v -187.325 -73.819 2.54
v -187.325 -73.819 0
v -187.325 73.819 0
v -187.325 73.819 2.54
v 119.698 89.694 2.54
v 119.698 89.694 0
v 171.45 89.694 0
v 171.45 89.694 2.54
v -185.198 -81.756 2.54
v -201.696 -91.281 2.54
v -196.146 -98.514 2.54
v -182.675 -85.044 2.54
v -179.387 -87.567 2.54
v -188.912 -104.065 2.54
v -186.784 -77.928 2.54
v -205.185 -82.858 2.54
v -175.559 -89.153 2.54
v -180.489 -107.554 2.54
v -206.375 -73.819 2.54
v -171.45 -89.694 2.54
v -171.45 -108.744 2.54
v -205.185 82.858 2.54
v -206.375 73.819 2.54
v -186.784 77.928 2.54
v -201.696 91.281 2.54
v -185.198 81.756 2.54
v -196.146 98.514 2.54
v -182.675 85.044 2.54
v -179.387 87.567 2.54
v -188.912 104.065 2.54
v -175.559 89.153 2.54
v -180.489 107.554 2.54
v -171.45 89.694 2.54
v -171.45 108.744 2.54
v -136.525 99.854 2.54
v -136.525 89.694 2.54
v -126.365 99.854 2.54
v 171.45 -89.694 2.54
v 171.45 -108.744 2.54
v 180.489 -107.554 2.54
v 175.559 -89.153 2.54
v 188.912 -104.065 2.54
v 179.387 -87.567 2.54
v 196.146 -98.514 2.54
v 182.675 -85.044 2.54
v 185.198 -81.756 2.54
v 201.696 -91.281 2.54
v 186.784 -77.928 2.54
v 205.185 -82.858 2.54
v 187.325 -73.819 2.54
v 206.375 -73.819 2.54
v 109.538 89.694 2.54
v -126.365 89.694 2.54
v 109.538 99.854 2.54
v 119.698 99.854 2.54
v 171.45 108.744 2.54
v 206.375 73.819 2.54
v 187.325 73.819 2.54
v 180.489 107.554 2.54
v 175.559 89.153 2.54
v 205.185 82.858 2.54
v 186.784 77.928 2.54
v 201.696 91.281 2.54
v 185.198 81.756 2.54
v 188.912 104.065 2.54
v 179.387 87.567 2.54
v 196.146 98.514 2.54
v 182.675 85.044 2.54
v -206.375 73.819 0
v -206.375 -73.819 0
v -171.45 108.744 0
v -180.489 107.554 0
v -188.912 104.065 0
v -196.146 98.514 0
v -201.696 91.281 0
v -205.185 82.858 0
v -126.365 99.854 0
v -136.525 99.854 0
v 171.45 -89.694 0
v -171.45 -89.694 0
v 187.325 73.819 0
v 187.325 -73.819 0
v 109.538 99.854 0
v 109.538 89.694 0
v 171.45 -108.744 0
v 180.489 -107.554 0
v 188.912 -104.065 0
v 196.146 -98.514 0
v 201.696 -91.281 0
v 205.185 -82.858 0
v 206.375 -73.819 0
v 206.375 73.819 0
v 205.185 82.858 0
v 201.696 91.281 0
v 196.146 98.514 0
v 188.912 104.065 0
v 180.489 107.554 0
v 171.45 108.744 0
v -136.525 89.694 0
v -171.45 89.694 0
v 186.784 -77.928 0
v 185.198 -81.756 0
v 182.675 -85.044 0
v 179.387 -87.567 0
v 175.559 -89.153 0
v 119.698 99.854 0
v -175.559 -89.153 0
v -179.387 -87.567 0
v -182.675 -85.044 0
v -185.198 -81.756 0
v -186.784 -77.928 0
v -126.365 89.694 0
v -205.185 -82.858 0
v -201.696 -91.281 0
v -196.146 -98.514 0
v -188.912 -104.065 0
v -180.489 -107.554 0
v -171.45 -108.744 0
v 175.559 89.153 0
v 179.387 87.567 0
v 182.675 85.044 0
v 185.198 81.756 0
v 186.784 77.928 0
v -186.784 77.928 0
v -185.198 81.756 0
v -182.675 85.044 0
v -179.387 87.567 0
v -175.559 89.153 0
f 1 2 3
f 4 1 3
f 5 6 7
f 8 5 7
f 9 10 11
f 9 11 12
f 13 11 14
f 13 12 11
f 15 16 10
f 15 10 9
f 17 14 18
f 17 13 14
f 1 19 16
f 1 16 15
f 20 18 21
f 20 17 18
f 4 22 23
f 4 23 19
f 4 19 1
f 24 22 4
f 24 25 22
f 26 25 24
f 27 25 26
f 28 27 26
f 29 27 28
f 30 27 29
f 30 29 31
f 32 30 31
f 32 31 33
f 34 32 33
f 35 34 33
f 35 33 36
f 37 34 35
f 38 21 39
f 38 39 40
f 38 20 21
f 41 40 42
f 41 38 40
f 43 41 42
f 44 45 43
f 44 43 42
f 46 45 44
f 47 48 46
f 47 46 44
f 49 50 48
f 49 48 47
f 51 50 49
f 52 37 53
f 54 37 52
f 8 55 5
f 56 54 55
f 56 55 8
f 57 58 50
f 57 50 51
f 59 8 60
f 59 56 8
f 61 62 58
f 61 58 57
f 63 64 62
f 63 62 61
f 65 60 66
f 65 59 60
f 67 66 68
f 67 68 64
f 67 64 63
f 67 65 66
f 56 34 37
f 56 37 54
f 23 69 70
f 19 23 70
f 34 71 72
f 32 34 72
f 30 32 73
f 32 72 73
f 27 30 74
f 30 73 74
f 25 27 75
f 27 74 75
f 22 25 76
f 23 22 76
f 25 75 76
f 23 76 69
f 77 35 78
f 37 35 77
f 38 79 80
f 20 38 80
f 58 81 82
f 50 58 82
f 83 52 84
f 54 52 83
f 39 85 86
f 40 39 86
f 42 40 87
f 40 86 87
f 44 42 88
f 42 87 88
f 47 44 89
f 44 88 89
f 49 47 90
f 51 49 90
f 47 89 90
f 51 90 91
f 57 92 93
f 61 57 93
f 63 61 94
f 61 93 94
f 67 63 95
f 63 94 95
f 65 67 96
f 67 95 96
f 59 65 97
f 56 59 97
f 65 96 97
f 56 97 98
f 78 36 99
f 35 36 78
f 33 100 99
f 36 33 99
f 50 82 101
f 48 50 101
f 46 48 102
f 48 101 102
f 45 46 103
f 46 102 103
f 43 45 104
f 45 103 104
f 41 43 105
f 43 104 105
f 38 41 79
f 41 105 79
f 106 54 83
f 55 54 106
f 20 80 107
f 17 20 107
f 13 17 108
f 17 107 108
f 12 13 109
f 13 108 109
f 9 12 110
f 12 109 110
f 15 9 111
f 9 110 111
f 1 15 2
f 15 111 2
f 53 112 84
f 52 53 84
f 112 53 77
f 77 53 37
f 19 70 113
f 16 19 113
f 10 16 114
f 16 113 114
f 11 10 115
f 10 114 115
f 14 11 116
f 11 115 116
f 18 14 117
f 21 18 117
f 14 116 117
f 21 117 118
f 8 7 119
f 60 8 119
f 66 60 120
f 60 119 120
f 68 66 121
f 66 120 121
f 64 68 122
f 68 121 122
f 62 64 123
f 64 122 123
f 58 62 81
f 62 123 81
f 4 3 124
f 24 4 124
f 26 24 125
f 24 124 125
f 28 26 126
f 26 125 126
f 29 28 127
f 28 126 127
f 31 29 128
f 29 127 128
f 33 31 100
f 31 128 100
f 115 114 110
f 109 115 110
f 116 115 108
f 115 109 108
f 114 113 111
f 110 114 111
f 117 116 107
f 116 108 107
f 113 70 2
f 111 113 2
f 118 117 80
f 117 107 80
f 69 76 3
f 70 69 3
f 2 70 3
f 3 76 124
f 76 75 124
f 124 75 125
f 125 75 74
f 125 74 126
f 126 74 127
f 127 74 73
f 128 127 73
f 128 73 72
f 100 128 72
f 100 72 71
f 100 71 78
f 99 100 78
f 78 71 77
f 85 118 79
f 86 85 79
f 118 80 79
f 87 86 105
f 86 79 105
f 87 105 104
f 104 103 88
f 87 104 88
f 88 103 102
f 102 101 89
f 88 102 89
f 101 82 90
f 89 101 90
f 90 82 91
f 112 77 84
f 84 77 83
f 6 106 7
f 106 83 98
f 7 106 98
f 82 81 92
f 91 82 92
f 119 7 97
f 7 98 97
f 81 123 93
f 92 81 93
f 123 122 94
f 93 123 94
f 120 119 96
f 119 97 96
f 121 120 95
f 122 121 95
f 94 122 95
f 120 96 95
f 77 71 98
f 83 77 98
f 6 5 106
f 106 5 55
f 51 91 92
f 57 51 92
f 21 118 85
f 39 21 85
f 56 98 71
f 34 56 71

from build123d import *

# Parameters (mm, degrees)
F1_DEPTH = 2.54
F2_W     = 10.16
F2_H     = 10.16
F3_DEPTH = 2.54


with BuildPart() as f1:
    # F0 (on Top) → F1 (new body)
    with BuildSketch(Plane.XY):
        with BuildLine():
            Line((206.375, -73.81875), (206.375, 73.81875))
            ThreePointArc((206.375, 73.81875), (196.145704, 98.514454), (171.45, 108.74375))
            Line((171.45, 108.74375), (-171.45, 108.74375))
            ThreePointArc((-171.45, 108.74375), (-196.145704, 98.514454), (-206.375, 73.81875))
            Line((-206.375, 73.81875), (-206.375, -73.81875))
            ThreePointArc((-206.375, -73.81875), (-196.145704, -98.514454), (-171.45, -108.74375))
            Line((-171.45, -108.74375), (171.45, -108.74375))
            ThreePointArc((171.45, -108.74375), (196.145704, -98.514454), (206.375, -73.81875))
        make_face()
        with BuildLine():
            ThreePointArc((187.325, -73.81875), (182.67532, -85.04407), (171.45, -89.69375))
            Line((171.45, -89.69375), (-171.45, -89.69375))
            ThreePointArc((-171.45, -89.69375), (-182.67532, -85.04407), (-187.325, -73.81875))
            Line((-187.325, -73.81875), (-187.325, 73.81875))
            ThreePointArc((-187.325, 73.81875), (-182.67532, 85.04407), (-171.45, 89.69375))
            Line((-171.45, 89.69375), (171.45, 89.69375))
            ThreePointArc((171.45, 89.69375), (182.67532, 85.04407), (187.325, 73.81875))
            Line((187.325, 73.81875), (187.325, -73.81875))
        make_face(mode=Mode.SUBTRACT)
    extrude(amount=F1_DEPTH)

    # F2 (on face) → F3 (cut, through all)
    with BuildSketch(Plane.XY.offset(2.54)):
        with Locations((-131.445, 94.77375)):
            Rectangle(F2_W, F2_H)
        with Locations((114.6175, 94.77375)):
            Rectangle(F2_W, F2_H)
    extrude(amount=-F3_DEPTH, mode=Mode.SUBTRACT)


solid = f1.part
